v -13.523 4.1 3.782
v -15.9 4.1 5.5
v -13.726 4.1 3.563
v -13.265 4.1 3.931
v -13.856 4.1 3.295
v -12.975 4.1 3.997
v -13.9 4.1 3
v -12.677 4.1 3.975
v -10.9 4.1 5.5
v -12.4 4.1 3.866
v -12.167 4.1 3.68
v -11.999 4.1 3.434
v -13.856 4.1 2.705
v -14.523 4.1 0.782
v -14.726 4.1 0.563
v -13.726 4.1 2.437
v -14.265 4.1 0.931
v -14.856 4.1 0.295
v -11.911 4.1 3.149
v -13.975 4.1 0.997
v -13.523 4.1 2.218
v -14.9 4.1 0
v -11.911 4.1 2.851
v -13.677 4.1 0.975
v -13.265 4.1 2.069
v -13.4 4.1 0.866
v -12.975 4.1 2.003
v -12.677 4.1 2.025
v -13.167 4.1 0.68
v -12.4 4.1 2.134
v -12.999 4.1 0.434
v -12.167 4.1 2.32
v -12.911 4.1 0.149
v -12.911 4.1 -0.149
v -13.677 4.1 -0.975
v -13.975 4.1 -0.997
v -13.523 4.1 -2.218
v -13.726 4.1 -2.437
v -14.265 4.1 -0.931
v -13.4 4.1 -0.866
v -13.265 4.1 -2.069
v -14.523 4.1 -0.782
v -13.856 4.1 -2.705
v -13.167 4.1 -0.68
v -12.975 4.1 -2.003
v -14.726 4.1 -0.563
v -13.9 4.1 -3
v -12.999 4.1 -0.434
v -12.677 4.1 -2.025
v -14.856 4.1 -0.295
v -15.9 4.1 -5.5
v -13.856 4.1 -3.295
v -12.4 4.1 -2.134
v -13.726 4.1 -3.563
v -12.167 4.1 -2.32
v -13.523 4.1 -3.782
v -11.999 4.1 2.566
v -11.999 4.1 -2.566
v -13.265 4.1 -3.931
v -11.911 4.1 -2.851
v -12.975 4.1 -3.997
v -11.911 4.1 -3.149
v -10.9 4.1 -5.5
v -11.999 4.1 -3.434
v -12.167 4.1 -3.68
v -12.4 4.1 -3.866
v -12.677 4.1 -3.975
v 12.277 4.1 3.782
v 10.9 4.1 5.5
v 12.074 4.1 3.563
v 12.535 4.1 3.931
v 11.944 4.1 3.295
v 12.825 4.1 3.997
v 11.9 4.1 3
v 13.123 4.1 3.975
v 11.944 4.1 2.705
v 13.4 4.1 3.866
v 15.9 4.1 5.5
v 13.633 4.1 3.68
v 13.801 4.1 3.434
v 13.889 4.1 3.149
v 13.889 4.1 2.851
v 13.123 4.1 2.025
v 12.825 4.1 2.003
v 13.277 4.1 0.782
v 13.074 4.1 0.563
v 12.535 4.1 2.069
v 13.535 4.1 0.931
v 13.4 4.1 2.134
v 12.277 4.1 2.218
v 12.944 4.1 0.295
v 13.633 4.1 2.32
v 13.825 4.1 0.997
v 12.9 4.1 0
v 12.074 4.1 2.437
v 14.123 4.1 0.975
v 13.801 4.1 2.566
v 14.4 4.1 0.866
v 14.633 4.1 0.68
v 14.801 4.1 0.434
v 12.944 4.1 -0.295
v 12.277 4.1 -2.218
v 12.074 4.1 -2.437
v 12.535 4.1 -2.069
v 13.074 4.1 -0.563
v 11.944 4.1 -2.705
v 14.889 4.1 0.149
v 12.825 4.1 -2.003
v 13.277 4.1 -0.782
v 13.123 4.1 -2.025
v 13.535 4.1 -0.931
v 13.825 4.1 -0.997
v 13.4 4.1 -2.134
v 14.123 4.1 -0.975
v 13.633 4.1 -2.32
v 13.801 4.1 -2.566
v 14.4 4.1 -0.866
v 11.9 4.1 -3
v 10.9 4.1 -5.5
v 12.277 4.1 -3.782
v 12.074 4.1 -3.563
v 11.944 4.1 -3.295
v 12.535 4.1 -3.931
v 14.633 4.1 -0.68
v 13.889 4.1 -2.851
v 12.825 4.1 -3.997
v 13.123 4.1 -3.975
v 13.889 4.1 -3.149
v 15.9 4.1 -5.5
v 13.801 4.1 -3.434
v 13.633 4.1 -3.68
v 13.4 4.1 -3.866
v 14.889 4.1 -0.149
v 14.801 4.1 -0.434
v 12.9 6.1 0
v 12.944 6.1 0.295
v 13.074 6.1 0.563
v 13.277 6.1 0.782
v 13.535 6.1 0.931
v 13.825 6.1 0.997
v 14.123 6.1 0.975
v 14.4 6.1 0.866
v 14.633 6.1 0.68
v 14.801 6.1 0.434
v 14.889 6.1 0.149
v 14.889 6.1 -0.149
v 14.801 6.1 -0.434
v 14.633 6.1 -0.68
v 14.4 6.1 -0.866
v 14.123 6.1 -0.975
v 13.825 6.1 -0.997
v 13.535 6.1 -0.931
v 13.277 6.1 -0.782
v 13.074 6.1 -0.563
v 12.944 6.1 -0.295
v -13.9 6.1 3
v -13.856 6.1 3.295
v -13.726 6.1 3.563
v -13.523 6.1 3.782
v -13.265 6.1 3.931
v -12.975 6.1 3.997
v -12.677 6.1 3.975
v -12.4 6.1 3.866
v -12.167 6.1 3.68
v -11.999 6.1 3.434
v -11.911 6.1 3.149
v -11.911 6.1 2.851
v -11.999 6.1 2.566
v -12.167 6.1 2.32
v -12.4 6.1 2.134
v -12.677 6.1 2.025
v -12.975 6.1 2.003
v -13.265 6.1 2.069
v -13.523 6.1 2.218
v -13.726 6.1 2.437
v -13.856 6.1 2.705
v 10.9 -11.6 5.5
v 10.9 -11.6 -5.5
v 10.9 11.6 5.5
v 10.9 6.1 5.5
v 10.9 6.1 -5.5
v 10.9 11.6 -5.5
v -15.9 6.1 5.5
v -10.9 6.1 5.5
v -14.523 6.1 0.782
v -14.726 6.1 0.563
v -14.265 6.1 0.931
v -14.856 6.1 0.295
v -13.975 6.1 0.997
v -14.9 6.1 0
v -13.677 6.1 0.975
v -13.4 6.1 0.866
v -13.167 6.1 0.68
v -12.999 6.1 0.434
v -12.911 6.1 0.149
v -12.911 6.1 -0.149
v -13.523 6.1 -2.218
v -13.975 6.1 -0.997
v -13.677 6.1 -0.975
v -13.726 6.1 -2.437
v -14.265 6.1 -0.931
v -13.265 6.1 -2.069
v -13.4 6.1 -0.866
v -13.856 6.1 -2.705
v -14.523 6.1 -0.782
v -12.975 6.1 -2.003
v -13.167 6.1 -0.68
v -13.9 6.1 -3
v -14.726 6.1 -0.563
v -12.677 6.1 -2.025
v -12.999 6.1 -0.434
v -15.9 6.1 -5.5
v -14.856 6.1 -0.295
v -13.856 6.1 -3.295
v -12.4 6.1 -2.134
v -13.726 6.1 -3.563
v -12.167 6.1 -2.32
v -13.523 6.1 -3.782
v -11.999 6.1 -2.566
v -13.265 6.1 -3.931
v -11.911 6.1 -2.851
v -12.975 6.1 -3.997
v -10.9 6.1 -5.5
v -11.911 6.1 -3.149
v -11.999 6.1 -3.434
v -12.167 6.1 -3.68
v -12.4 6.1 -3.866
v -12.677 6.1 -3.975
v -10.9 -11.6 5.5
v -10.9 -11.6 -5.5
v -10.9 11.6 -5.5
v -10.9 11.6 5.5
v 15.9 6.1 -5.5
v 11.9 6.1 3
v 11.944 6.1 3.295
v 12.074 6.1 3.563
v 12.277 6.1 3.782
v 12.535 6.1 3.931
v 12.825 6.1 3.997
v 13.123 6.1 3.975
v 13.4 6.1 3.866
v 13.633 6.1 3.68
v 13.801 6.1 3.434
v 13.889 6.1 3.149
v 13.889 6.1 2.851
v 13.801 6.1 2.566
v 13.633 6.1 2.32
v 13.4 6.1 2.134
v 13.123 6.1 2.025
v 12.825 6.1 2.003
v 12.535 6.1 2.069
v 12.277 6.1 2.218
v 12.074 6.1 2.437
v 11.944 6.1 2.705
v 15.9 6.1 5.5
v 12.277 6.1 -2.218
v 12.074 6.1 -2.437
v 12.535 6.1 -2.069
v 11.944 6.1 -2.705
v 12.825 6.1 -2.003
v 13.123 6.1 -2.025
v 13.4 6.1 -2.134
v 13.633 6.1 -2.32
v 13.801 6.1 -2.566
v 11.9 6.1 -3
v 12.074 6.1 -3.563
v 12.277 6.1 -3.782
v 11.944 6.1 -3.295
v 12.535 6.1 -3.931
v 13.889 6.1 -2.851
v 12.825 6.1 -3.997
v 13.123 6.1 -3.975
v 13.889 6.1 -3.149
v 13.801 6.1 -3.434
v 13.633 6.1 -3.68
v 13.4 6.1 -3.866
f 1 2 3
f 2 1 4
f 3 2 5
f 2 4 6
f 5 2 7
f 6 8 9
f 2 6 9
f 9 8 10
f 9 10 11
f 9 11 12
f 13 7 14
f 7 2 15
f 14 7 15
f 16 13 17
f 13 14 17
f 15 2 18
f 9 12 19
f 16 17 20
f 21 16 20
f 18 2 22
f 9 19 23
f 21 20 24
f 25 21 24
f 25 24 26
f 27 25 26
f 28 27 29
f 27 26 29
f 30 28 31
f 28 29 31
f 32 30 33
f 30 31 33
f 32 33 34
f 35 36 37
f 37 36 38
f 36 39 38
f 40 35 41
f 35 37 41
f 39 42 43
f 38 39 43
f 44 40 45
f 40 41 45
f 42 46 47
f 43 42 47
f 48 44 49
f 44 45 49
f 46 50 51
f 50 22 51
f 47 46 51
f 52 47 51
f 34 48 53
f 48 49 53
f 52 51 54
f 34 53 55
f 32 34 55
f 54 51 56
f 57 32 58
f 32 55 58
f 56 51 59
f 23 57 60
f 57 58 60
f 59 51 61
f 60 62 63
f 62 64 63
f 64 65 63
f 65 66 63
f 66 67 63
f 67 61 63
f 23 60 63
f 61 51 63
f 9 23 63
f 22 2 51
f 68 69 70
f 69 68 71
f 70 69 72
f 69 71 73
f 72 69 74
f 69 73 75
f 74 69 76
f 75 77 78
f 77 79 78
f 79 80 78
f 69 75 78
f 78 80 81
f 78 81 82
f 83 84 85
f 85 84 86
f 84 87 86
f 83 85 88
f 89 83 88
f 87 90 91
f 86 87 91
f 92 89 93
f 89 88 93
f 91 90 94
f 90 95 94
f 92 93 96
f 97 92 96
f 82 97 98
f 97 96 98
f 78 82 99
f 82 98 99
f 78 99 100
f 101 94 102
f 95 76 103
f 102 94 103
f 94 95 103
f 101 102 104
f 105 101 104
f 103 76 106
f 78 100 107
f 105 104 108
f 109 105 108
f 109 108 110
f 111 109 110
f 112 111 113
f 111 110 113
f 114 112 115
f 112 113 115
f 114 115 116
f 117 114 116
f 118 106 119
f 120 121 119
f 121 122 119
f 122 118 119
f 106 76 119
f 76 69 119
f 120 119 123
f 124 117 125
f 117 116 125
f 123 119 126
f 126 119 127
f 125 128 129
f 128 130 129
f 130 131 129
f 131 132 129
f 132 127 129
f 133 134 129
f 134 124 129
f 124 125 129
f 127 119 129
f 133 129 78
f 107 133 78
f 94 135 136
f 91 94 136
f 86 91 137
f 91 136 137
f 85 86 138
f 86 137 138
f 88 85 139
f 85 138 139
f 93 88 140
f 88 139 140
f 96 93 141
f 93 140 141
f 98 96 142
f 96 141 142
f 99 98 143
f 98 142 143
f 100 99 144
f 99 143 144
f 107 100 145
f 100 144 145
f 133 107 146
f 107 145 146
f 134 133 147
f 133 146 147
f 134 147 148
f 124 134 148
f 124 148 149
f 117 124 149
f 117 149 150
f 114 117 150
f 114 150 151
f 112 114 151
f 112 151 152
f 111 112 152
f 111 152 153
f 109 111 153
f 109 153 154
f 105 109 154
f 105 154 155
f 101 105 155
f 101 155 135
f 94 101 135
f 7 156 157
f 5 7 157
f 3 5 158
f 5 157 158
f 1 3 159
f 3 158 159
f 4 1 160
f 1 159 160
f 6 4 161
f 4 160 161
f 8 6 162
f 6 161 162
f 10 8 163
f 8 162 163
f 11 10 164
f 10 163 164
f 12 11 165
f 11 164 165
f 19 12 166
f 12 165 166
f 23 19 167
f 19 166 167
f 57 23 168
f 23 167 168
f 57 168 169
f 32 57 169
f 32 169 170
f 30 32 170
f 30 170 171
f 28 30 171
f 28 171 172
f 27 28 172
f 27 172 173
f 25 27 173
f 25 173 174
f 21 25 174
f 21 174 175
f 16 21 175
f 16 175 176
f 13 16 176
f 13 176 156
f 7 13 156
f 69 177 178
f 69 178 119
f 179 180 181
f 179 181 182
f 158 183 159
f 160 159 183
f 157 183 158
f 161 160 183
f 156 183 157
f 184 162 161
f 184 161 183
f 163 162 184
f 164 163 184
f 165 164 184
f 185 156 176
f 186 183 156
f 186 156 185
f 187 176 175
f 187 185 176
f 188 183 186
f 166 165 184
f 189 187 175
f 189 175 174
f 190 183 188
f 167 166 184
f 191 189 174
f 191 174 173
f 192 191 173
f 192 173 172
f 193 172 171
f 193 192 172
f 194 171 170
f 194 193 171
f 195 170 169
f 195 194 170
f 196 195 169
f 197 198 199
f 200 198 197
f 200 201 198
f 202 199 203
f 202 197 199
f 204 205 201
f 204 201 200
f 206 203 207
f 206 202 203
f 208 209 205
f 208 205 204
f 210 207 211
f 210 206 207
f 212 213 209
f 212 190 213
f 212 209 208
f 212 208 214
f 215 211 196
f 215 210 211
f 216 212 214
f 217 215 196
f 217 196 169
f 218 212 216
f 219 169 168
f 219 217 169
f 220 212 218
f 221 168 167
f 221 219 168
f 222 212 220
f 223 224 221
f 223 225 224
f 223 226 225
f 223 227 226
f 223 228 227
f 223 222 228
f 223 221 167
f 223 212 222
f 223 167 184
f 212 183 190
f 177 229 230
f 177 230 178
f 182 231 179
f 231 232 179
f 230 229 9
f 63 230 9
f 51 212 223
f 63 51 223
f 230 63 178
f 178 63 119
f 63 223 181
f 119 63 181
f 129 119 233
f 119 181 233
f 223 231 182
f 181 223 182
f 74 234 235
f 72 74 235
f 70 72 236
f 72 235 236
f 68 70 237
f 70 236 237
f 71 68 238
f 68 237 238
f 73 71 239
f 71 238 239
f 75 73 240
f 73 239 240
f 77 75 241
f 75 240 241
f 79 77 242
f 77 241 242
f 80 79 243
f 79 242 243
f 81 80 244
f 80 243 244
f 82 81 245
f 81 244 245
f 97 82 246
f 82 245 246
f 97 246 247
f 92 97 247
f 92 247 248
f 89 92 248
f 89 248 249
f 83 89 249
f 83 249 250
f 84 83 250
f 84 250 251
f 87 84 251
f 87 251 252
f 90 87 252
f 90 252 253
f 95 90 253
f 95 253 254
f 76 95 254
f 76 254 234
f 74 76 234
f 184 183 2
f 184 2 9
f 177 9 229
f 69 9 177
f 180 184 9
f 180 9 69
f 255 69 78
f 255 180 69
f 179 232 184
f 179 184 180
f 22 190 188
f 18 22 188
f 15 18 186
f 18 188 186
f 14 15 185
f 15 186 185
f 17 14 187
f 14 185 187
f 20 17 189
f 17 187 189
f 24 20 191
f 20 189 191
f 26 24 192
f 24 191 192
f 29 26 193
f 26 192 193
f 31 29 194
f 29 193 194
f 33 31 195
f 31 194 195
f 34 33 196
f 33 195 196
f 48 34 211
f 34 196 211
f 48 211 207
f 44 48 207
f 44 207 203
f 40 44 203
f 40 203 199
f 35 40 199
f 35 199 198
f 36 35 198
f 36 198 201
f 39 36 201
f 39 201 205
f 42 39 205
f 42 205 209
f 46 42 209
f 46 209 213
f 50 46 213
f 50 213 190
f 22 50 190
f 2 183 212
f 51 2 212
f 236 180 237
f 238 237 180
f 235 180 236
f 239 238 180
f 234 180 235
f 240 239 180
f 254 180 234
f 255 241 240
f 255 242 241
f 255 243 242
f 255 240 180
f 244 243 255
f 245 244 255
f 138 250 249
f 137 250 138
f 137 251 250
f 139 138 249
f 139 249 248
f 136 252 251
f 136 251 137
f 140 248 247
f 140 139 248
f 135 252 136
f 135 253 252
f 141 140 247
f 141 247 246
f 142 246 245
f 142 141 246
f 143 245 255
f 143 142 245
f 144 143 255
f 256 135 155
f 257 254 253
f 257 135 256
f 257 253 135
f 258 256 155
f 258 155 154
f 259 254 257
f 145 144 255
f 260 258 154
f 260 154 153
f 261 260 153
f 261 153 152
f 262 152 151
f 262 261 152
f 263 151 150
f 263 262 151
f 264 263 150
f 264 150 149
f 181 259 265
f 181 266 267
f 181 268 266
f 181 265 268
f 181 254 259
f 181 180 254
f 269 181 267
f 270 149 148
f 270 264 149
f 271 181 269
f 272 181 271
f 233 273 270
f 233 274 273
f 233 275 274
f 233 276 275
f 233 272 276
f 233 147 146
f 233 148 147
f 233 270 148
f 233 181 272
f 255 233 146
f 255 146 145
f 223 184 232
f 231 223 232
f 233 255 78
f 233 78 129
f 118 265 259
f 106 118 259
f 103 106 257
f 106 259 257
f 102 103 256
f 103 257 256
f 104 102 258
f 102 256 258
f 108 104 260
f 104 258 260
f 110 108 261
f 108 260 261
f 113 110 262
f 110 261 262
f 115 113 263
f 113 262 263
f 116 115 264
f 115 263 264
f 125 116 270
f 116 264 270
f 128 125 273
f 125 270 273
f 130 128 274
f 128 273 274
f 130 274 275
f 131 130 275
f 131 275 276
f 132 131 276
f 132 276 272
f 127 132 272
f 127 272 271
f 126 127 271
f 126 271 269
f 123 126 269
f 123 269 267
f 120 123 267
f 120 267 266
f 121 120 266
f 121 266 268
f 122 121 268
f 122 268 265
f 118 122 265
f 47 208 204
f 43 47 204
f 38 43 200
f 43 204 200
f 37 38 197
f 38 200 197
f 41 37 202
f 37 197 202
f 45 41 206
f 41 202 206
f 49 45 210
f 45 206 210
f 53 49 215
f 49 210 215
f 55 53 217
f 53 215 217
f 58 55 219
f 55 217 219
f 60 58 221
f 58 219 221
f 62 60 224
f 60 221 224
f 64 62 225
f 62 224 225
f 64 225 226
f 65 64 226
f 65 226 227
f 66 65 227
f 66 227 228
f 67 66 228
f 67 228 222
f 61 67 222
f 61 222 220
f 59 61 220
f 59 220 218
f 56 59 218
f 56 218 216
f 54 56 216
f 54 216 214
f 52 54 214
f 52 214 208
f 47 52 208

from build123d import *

# Parameters (mm, degrees)
SKETCH1_W           = 21.8
SKETCH1_H           = 23.2
BOSS_EXTRUDE1_DEPTH = 5.5
BOSS_EXTRUDE2_START = -5.5
SKETCH2_W           = 31.8
SKETCH2_H           = 11
BOSS_EXTRUDE2_DEPTH = 2
SKETCH3_R           = 1
CUT_EXTRUDE1_DEPTH  = 25.420278459


with BuildPart() as part:
    # Sketch1 → Boss-Extrude1 (new, symmetric)
    with BuildSketch(Plane.XY):
        Rectangle(SKETCH1_W, SKETCH1_H)
    extrude(amount=BOSS_EXTRUDE1_DEPTH, both=True)

    # Sketch2 → Boss-Extrude2 (add)
    with BuildSketch(Plane(origin=(0, 11.6, 0), x_dir=(1, 0, 0), z_dir=(0, 1, 0)).offset(BOSS_EXTRUDE2_START)):
        Rectangle(SKETCH2_W, SKETCH2_H)
    extrude(amount=-BOSS_EXTRUDE2_DEPTH)

    # Sketch3 → Cut-Extrude1 (cut, through all)
    with BuildSketch(Plane(origin=(0, 6.1, 0), x_dir=(1, 0, 0), z_dir=(0, 1, 0))):
        with Locations(Location((-13.9, 0, 0), (0, 0, 180))):
            Circle(SKETCH3_R)
        with Locations(Location((-12.9, 3, 0), (0, 0, 180))):
            Circle(SKETCH3_R)
        with Locations(Location((-12.9, -3, 0), (0, 0, 180))):
            Circle(SKETCH3_R)
        with Locations(Location((12.9, -3, 0), (0, 0, 180))):
            Circle(SKETCH3_R)
        with Locations(Location((12.9, 3, 0), (0, 0, 180))):
            Circle(SKETCH3_R)
        with Locations(Location((13.9, 0, 0), (0, 0, 180))):
            Circle(SKETCH3_R)
    extrude(amount=-CUT_EXTRUDE1_DEPTH, mode=Mode.SUBTRACT)


solid = part.part
